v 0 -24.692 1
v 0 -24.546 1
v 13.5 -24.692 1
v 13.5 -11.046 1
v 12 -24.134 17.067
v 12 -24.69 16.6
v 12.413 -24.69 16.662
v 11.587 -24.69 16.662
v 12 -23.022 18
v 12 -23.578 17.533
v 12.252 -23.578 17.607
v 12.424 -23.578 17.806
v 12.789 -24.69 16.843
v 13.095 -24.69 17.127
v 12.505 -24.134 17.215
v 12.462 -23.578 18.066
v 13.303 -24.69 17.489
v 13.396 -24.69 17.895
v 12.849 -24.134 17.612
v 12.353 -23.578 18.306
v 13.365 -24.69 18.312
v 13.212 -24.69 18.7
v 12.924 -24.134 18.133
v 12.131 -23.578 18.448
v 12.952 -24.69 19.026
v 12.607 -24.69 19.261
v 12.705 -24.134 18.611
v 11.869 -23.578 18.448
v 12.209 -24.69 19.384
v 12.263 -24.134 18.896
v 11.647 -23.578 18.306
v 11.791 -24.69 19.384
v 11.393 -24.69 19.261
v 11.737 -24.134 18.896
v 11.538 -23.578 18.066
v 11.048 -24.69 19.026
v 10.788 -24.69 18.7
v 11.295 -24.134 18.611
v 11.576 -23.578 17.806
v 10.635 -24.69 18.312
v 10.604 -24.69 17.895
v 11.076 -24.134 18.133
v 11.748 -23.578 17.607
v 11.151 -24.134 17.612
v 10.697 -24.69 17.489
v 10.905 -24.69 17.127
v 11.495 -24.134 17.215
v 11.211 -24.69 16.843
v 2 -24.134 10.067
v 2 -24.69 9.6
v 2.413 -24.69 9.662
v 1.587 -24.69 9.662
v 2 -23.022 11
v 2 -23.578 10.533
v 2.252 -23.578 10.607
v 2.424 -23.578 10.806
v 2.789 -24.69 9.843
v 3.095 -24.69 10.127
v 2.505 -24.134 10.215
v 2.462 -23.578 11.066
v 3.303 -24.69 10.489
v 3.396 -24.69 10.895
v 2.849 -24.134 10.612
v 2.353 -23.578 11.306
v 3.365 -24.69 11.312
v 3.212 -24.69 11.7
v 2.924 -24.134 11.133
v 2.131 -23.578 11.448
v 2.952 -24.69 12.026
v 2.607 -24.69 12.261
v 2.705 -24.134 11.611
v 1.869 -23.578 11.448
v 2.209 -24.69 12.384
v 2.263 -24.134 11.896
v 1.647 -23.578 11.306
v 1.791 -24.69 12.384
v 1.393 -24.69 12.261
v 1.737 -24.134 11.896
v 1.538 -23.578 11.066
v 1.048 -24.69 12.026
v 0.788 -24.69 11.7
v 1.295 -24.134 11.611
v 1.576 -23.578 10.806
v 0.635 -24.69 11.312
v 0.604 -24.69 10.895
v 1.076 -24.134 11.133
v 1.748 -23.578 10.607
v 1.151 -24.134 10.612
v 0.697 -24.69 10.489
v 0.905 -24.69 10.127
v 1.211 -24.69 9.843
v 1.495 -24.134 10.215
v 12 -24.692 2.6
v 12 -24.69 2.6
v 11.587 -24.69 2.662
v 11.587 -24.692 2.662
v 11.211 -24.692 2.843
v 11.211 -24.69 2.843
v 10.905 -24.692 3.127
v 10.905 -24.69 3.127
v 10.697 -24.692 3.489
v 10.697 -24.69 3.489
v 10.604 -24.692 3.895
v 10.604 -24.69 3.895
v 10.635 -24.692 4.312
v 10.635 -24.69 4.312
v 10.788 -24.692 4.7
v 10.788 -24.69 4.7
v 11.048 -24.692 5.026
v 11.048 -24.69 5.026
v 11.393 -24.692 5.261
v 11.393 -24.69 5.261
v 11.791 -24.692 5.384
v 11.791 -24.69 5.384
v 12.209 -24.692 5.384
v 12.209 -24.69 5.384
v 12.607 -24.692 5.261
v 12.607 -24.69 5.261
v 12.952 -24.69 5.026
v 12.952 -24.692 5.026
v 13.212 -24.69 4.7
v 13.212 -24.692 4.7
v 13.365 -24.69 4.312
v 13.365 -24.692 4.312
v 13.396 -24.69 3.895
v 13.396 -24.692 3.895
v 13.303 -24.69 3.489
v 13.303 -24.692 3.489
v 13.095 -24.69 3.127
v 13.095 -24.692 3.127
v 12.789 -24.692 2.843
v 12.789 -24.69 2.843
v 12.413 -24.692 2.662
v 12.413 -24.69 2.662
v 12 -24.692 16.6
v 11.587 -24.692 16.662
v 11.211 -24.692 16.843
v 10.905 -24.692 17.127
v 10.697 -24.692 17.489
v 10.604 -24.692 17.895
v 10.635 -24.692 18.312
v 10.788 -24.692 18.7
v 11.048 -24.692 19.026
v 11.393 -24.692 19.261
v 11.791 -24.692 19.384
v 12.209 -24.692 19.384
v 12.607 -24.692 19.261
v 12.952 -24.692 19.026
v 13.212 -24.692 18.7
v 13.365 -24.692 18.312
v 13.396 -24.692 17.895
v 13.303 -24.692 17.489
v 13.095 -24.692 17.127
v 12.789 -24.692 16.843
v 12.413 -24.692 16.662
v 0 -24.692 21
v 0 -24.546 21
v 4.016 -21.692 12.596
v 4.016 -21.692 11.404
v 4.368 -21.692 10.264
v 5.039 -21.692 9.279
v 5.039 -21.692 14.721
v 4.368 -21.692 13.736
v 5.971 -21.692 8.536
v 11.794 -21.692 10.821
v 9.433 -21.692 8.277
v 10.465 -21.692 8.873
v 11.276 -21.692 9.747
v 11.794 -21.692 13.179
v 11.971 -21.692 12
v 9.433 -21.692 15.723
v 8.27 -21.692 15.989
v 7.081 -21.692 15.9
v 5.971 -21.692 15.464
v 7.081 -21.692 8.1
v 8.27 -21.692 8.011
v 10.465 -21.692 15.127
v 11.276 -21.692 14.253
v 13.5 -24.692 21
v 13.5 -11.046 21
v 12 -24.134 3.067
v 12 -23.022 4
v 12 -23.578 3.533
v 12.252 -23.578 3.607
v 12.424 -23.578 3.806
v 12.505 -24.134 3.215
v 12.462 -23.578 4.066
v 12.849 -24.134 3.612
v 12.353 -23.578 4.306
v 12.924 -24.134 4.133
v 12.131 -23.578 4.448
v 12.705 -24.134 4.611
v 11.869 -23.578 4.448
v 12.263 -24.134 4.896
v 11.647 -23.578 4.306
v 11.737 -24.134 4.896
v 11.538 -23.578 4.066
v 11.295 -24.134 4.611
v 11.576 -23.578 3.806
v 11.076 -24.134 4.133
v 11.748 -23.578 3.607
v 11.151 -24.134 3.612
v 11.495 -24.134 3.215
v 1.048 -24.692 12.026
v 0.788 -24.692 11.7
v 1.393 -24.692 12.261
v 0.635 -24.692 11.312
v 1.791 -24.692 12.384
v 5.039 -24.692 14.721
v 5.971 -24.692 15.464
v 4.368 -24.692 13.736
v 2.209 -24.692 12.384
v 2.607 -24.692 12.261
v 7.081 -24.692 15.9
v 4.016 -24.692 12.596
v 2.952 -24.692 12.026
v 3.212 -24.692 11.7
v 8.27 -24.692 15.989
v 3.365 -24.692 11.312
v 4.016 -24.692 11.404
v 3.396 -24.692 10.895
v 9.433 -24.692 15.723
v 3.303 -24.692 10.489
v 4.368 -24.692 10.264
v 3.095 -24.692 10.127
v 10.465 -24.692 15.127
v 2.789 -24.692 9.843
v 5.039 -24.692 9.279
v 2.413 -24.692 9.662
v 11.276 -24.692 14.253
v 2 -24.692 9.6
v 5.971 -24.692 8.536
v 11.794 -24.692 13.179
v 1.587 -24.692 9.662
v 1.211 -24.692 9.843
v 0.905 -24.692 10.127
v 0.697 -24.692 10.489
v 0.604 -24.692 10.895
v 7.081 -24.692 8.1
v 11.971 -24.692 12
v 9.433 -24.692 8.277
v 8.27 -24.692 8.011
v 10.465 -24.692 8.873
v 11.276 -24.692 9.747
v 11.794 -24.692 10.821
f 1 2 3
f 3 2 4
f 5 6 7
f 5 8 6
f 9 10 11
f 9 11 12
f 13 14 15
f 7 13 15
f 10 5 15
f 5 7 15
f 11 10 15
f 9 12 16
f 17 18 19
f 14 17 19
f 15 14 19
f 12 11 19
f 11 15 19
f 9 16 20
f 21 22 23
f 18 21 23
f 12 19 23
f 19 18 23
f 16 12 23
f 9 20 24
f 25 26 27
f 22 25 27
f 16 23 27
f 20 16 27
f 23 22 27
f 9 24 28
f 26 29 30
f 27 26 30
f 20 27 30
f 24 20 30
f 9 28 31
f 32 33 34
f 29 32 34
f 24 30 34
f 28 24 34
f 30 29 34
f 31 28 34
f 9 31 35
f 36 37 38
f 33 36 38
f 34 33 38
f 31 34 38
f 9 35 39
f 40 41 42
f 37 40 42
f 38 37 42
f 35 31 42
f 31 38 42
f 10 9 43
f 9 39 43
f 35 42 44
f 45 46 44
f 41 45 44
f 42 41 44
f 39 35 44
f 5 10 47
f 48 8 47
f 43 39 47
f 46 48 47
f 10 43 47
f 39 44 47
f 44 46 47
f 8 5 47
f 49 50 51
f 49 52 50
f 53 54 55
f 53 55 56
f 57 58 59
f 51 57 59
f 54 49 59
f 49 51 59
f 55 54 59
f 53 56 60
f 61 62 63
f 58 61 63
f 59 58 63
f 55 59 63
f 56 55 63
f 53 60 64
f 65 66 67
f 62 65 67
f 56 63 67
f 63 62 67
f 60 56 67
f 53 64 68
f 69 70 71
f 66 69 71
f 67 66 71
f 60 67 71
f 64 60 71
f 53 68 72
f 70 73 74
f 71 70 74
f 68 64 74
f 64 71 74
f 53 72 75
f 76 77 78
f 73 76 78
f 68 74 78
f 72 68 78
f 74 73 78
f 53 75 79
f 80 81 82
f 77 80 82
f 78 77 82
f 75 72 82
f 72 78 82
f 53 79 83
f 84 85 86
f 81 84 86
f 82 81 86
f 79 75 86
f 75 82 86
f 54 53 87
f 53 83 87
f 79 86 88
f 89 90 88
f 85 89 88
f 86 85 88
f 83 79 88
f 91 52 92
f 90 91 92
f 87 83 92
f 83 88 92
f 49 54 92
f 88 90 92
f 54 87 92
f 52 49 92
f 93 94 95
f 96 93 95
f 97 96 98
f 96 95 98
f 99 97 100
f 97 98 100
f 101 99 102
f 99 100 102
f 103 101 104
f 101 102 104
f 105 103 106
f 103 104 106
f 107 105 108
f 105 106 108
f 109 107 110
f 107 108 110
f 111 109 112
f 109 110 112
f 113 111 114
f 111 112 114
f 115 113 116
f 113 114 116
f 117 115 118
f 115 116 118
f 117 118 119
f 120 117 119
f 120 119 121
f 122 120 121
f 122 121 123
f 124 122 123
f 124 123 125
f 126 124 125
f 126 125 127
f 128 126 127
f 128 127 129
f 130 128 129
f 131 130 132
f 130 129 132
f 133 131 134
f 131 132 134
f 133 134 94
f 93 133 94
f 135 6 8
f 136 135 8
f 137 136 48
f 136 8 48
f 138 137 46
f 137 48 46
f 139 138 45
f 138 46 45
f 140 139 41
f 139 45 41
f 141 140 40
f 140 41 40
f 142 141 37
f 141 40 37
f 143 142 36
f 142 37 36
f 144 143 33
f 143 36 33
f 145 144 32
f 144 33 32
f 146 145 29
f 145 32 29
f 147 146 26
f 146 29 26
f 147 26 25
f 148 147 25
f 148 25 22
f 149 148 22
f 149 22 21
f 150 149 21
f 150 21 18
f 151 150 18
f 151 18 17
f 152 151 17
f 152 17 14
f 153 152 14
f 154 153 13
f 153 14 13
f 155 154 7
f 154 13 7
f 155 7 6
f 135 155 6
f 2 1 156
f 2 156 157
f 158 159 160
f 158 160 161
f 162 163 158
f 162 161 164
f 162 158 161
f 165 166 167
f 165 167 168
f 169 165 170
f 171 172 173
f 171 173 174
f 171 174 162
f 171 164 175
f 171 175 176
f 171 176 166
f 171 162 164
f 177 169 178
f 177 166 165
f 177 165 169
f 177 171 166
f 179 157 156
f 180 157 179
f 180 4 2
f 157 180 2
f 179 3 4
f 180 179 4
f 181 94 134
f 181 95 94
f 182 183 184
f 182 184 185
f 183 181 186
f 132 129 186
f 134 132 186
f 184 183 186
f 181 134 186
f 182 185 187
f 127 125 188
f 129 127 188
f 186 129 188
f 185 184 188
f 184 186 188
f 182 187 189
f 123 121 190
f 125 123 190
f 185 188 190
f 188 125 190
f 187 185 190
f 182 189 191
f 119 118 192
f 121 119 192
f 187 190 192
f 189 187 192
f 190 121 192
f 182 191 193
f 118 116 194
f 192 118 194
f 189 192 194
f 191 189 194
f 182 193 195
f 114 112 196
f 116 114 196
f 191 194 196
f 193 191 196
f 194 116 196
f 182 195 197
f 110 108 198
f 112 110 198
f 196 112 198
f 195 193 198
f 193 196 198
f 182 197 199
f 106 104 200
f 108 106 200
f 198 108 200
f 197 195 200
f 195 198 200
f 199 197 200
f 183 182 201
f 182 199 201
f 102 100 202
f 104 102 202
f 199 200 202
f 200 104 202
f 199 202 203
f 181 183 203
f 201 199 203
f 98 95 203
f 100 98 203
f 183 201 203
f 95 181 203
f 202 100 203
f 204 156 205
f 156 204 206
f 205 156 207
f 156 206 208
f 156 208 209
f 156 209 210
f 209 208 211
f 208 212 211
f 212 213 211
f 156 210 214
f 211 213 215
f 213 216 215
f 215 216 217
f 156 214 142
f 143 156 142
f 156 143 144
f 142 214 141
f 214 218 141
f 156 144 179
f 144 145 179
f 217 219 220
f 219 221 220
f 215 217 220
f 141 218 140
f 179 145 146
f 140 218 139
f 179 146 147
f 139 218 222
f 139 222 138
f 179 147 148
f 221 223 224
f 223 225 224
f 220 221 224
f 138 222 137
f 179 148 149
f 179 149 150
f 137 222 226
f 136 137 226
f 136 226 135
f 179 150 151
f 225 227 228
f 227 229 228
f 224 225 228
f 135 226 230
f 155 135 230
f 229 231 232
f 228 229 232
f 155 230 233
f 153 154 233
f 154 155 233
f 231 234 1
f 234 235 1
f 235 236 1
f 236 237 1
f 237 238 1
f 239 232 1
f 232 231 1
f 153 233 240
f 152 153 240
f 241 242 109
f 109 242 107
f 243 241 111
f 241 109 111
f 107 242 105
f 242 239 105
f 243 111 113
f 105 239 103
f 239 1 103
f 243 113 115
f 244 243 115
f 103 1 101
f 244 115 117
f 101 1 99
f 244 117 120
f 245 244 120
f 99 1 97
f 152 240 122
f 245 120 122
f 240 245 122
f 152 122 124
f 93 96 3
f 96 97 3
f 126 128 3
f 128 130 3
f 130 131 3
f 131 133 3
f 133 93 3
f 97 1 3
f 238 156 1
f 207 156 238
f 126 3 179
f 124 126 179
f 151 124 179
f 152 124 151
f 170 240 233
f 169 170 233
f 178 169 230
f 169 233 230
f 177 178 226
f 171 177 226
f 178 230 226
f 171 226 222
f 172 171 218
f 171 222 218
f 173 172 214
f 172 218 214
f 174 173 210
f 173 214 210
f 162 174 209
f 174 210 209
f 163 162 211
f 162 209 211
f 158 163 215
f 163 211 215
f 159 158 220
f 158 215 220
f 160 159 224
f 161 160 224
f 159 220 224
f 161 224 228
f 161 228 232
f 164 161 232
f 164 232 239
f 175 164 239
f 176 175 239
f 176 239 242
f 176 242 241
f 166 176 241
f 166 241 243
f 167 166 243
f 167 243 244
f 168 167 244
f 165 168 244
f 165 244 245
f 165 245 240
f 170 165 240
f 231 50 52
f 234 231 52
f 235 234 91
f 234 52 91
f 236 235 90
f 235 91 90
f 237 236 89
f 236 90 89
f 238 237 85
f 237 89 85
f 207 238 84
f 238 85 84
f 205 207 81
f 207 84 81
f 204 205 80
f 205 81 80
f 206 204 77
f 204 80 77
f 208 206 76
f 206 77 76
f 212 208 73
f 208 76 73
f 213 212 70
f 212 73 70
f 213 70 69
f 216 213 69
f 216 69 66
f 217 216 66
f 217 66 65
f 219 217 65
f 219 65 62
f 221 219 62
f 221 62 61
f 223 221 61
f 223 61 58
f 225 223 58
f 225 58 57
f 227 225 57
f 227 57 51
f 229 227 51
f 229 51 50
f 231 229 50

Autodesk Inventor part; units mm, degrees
ref_plane "YZ Plane" through (0, 0, 0) normal (1, 0, 0) x (0, 1, 0)
ref_plane "XZ Plane" through (0, 0, 0) normal (0, 1, 0) x (-1, 0, 0)
ref_plane "XY Plane" through (0, 0, 0) normal (0, 0, 1) x (1, 0, 0)
ref_plane "Arbeitsebene1" through (0, 0, 1) normal (0, 0, 1) x (1, 0, 0)
sketch "Skizze1" plane through (0, 0, 1) normal (0, 0, 1) x (1, 0, 0)
  line L0 (0, -25) -> (0, 0) projected
  line L1 (0, -25) -> (14, -25) projected
  line L2 (14, 0) -> (14, -25) projected
  line L3 (0, 0) -> (14, 0) projected
  line L4 (-1, -11.3514) -> (-6.5, -11.3514) construction
  line L5 (-4.5, -14.125) -> (-37.3, -14.125) construction
  line L6 (-1, -16.6486) -> (-6.5, -16.6486) construction
  line L7 (4, 20.8392) -> (4, 0) construction
  line L8 (12, 20.8392) -> (12, 0) construction
  line L9 (8, 20.6561) -> (8, -14) construction
  line L10 (-4.5, -14) -> (8, -14) construction
  line L11 (1.6137, -20.3863) -> (12.8954, -9.1046) construction
  line L12 (1.6137, -20.3863) -> (17.5684, -20.3863) construction
  line L13 (0, -25) -> (14, -25) construction
  line L14 (0, -24.6915) -> (13.5, -24.6915)
  line L15 (13.5, -24.6915) -> (13.5, -11.0456)
  line L16 (13.5, -11.0456) -> (0, -24.5456)
  line L17 (0, -24.6915) -> (0, -24.5456)
  dimension "d0" = 4
  dimension "d1" = 5.2972
  dimension "d2" = 2.6486
  dimension "d3" = 45
  dimension "d4" = 1.8
  dimension "d5" = 0.5
extrude "Extrusion1" add sketch "Skizze1" along normal blind 20 contours L0 L16 L15 L14
sketch "Skizze2" plane through (0, -24.6915, 1) normal (0, -1, 0) x (1, 0, 0)
  circle A0 centre (12, 17) radius 1.4 projected
  line L0 (0, 2.559) -> (10.6713, 2.559) projected
  circle A1 centre (12, 3) radius 1.4 projected
  circle A2 centre (2, 10) radius 1.4 projected
  point P0 (0, -1)
hole "Bohrung1" at (12, -24.6915, 18) at (12, -24.6915, 4) at (2, -24.6915, 11) direction (0, 1, 0) diameter 2.8 depth 0.001 tip angle 80
sketch "Skizze3" plane through (0, -24.6915, 1) normal (0, -1, 0) x (1, 0, 0)
  line L0 (0, 20) -> (13.5, 20) projected
  line L1 (0, 0) -> (13.5, 0) projected
  line L2 (13.5, 0) -> (13.5, 20) projected
  line L3 (0, -7) -> (0, 29) projected
  circle A0 centre (7.9714, 11) radius 4
  point P0 (0, -1)
  dimension "d15" = 8
extrude "Extrusion2" cut sketch "Skizze3" against normal blind 3 contours A0
equation "\"d2\" = 0.5 * d1"
properties part number "TIRFImager_KinematicMirror_v3"
